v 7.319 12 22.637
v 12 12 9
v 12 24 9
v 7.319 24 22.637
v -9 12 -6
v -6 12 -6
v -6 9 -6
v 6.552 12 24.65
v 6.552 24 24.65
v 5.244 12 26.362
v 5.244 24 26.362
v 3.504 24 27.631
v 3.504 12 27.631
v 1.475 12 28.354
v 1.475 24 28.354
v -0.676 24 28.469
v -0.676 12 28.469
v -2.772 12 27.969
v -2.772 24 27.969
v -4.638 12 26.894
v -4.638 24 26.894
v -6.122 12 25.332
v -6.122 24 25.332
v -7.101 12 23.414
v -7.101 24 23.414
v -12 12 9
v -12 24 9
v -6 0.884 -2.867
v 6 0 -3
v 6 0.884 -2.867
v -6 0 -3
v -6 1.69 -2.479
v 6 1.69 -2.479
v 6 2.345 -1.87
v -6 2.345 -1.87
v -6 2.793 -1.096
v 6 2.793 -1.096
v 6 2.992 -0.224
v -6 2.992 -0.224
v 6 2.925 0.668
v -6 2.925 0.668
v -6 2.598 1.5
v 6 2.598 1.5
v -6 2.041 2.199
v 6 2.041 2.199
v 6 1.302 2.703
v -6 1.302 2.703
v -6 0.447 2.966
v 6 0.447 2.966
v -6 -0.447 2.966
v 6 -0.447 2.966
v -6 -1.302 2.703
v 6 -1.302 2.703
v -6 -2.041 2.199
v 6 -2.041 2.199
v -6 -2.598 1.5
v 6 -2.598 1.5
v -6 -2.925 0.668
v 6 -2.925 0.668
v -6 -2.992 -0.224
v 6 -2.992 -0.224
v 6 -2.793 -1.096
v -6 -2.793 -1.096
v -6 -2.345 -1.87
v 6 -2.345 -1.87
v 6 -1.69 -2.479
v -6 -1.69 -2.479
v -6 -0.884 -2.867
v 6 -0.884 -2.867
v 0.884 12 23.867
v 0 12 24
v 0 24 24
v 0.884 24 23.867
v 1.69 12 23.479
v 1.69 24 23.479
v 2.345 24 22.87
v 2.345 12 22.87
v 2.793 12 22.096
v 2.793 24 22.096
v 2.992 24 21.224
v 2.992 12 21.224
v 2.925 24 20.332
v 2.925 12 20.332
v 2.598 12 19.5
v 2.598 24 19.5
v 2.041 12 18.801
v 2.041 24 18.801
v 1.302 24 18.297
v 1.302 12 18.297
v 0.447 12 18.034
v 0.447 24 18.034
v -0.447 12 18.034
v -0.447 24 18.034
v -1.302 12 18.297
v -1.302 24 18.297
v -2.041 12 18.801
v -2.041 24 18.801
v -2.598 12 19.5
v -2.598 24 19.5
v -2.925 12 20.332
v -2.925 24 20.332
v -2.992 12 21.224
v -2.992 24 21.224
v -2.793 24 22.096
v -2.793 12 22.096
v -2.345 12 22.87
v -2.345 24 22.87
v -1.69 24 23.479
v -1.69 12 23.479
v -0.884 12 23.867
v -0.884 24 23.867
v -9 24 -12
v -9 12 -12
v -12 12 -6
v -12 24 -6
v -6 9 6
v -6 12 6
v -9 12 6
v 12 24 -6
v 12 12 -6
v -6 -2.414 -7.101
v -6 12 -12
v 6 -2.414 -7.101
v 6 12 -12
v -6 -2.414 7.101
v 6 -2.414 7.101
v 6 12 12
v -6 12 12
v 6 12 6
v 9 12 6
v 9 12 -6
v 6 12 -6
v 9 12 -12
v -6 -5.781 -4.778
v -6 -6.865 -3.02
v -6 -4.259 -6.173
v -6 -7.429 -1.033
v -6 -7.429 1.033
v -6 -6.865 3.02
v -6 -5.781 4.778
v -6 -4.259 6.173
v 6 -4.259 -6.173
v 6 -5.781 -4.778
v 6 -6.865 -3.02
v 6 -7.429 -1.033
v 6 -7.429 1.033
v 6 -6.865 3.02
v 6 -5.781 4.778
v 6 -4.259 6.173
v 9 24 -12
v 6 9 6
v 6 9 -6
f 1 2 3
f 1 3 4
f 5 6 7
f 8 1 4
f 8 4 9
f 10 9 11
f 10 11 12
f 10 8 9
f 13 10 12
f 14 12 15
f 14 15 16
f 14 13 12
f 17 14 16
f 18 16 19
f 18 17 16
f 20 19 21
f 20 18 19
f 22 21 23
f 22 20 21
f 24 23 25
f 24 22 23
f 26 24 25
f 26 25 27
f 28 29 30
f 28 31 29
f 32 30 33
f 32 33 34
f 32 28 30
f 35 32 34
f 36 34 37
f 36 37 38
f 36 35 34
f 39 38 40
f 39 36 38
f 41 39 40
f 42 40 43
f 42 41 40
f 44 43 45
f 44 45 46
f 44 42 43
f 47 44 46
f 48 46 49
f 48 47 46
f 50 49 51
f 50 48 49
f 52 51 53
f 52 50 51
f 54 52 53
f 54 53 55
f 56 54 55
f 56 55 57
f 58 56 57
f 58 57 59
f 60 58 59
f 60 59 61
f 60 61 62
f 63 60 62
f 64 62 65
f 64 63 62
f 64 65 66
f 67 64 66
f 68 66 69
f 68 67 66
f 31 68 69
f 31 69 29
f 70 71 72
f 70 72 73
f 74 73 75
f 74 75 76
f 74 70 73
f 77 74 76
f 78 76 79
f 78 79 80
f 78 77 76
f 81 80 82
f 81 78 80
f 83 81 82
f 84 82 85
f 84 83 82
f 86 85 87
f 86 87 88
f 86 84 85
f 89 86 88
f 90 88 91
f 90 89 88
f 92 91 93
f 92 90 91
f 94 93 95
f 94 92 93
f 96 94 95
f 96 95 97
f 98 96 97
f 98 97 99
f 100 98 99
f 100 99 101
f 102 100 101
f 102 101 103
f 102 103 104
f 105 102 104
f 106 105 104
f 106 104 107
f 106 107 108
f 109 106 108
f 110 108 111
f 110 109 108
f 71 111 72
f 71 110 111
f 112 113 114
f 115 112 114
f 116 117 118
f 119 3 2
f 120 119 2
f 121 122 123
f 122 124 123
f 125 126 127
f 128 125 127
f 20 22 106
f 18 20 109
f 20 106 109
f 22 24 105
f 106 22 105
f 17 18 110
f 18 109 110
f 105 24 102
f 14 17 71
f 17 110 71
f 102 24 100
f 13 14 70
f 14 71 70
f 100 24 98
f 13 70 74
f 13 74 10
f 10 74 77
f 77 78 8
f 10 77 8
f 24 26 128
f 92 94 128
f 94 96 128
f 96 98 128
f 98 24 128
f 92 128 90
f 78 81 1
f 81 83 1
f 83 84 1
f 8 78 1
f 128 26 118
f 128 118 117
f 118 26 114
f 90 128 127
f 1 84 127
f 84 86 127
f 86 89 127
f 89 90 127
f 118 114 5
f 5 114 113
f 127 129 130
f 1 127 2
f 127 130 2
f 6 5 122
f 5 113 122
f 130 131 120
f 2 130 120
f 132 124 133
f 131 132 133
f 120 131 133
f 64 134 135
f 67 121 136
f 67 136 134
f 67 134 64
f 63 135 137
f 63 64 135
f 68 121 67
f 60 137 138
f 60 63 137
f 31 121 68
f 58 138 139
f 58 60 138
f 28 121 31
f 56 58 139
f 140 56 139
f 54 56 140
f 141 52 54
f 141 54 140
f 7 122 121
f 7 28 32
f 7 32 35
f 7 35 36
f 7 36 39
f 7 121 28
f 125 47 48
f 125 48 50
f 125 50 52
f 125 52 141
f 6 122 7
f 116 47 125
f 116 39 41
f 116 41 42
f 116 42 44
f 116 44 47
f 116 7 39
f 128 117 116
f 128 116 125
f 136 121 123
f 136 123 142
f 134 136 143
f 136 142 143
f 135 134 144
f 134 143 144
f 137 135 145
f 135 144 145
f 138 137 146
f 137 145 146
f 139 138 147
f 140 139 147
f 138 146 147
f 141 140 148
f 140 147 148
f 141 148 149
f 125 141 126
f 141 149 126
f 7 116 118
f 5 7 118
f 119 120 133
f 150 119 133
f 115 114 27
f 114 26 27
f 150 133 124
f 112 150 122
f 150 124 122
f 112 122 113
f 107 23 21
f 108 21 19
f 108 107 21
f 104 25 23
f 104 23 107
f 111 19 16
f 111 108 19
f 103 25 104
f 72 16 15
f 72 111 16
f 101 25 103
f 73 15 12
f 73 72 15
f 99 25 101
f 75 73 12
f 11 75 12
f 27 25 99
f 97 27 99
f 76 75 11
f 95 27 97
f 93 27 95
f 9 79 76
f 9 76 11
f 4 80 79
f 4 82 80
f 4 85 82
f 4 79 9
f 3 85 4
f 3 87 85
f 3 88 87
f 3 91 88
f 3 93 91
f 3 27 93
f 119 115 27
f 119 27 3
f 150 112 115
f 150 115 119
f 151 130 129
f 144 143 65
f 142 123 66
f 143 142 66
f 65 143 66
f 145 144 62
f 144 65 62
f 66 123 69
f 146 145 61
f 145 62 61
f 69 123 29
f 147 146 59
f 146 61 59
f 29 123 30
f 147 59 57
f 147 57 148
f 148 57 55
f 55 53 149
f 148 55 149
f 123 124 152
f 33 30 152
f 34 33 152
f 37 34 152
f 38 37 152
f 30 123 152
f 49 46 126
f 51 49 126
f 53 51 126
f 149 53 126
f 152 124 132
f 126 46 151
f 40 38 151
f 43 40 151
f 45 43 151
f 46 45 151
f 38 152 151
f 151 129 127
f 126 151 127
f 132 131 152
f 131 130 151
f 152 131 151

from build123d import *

# Parameters (mm, degrees)
SKETCH_1_R      = 3
EXTRUDE_1_DEPTH = 6
SKETCH_2_R      = 3
EXTRUDE_2_DEPTH = 12
EXTRUDE_3_DEPTH = 3
EXTRUDE_4_DEPTH = 12
EXTRUDE_5_DEPTH = 12


with BuildPart() as part:
    # 스케치1 → 보스-돌출1 (new, symmetric)
    with BuildSketch(Plane(origin=(0, 0, 0), x_dir=(0, 0, -1), z_dir=(1, 0, 0))):
        with BuildLine():
            Line((-12, 12), (12, 12))
            Line((12, 12), (7.101042921, -2.413542921))
            ThreePointArc((7.101042921, -2.413542921), (0, -7.5), (-7.101042921, -2.413542921))
            Line((-7.101042921, -2.413542921), (-12, 12))
        make_face()
        Circle(SKETCH_1_R, mode=Mode.SUBTRACT)
    extrude(amount=EXTRUDE_1_DEPTH, both=True)

    # 스케치2 → 보스-돌출2 (add)
    with BuildSketch(Plane(origin=(0, 12, 0), x_dir=(1, 0, 0), z_dir=(0, 1, 0))):
        with BuildLine():
            Line((-12, -9), (12, -9))
            Line((12, -9), (7.319153043, -22.637070166))
            ThreePointArc((7.319153043, -22.637070166), (0.403262311, -28.489150787), (-7.101042921, -23.413542921))
            Line((-7.101042921, -23.413542921), (-12, -9))
        make_face()
        with Locations(Location((0, -21, 0), (0, 0, 270))):
            Circle(SKETCH_2_R, mode=Mode.SUBTRACT)
    extrude(amount=EXTRUDE_2_DEPTH)

    # 스케치3 → 보스-돌출3 (add)
    with BuildSketch(Plane(origin=(0, 0, 9), x_dir=(-1, 0, 0), z_dir=(0, 0, -1))):
        Polygon((-12, 12), (-6, 12), (6, 12), (12, 12), (12, 24), (-12, 24), align=None)
    extrude(amount=EXTRUDE_3_DEPTH)

    # 스케치4 → 보스-돌출4 (add)
    with BuildSketch(Plane(origin=(0, 0, 6), x_dir=(-1, 0, 0), z_dir=(0, 0, -1))):
        Polygon((-9, 12), (-6, 9), (-6, 12), (6, 12), (6, 9), (9, 12), (12, 12), (12, 24), (-12, 24), (-12, 12), align=None)
    extrude(amount=EXTRUDE_4_DEPTH)

    # 스케치5 → 보스-돌출5 (add)
    with BuildSketch(Plane(origin=(0, 12, 0), x_dir=(1, 0, 0), z_dir=(0, 1, 0))):
        Polygon((-12, 6), (12, 6), (9, 12), (-9, 12), align=None)
    extrude(amount=EXTRUDE_5_DEPTH)


solid = part.part
